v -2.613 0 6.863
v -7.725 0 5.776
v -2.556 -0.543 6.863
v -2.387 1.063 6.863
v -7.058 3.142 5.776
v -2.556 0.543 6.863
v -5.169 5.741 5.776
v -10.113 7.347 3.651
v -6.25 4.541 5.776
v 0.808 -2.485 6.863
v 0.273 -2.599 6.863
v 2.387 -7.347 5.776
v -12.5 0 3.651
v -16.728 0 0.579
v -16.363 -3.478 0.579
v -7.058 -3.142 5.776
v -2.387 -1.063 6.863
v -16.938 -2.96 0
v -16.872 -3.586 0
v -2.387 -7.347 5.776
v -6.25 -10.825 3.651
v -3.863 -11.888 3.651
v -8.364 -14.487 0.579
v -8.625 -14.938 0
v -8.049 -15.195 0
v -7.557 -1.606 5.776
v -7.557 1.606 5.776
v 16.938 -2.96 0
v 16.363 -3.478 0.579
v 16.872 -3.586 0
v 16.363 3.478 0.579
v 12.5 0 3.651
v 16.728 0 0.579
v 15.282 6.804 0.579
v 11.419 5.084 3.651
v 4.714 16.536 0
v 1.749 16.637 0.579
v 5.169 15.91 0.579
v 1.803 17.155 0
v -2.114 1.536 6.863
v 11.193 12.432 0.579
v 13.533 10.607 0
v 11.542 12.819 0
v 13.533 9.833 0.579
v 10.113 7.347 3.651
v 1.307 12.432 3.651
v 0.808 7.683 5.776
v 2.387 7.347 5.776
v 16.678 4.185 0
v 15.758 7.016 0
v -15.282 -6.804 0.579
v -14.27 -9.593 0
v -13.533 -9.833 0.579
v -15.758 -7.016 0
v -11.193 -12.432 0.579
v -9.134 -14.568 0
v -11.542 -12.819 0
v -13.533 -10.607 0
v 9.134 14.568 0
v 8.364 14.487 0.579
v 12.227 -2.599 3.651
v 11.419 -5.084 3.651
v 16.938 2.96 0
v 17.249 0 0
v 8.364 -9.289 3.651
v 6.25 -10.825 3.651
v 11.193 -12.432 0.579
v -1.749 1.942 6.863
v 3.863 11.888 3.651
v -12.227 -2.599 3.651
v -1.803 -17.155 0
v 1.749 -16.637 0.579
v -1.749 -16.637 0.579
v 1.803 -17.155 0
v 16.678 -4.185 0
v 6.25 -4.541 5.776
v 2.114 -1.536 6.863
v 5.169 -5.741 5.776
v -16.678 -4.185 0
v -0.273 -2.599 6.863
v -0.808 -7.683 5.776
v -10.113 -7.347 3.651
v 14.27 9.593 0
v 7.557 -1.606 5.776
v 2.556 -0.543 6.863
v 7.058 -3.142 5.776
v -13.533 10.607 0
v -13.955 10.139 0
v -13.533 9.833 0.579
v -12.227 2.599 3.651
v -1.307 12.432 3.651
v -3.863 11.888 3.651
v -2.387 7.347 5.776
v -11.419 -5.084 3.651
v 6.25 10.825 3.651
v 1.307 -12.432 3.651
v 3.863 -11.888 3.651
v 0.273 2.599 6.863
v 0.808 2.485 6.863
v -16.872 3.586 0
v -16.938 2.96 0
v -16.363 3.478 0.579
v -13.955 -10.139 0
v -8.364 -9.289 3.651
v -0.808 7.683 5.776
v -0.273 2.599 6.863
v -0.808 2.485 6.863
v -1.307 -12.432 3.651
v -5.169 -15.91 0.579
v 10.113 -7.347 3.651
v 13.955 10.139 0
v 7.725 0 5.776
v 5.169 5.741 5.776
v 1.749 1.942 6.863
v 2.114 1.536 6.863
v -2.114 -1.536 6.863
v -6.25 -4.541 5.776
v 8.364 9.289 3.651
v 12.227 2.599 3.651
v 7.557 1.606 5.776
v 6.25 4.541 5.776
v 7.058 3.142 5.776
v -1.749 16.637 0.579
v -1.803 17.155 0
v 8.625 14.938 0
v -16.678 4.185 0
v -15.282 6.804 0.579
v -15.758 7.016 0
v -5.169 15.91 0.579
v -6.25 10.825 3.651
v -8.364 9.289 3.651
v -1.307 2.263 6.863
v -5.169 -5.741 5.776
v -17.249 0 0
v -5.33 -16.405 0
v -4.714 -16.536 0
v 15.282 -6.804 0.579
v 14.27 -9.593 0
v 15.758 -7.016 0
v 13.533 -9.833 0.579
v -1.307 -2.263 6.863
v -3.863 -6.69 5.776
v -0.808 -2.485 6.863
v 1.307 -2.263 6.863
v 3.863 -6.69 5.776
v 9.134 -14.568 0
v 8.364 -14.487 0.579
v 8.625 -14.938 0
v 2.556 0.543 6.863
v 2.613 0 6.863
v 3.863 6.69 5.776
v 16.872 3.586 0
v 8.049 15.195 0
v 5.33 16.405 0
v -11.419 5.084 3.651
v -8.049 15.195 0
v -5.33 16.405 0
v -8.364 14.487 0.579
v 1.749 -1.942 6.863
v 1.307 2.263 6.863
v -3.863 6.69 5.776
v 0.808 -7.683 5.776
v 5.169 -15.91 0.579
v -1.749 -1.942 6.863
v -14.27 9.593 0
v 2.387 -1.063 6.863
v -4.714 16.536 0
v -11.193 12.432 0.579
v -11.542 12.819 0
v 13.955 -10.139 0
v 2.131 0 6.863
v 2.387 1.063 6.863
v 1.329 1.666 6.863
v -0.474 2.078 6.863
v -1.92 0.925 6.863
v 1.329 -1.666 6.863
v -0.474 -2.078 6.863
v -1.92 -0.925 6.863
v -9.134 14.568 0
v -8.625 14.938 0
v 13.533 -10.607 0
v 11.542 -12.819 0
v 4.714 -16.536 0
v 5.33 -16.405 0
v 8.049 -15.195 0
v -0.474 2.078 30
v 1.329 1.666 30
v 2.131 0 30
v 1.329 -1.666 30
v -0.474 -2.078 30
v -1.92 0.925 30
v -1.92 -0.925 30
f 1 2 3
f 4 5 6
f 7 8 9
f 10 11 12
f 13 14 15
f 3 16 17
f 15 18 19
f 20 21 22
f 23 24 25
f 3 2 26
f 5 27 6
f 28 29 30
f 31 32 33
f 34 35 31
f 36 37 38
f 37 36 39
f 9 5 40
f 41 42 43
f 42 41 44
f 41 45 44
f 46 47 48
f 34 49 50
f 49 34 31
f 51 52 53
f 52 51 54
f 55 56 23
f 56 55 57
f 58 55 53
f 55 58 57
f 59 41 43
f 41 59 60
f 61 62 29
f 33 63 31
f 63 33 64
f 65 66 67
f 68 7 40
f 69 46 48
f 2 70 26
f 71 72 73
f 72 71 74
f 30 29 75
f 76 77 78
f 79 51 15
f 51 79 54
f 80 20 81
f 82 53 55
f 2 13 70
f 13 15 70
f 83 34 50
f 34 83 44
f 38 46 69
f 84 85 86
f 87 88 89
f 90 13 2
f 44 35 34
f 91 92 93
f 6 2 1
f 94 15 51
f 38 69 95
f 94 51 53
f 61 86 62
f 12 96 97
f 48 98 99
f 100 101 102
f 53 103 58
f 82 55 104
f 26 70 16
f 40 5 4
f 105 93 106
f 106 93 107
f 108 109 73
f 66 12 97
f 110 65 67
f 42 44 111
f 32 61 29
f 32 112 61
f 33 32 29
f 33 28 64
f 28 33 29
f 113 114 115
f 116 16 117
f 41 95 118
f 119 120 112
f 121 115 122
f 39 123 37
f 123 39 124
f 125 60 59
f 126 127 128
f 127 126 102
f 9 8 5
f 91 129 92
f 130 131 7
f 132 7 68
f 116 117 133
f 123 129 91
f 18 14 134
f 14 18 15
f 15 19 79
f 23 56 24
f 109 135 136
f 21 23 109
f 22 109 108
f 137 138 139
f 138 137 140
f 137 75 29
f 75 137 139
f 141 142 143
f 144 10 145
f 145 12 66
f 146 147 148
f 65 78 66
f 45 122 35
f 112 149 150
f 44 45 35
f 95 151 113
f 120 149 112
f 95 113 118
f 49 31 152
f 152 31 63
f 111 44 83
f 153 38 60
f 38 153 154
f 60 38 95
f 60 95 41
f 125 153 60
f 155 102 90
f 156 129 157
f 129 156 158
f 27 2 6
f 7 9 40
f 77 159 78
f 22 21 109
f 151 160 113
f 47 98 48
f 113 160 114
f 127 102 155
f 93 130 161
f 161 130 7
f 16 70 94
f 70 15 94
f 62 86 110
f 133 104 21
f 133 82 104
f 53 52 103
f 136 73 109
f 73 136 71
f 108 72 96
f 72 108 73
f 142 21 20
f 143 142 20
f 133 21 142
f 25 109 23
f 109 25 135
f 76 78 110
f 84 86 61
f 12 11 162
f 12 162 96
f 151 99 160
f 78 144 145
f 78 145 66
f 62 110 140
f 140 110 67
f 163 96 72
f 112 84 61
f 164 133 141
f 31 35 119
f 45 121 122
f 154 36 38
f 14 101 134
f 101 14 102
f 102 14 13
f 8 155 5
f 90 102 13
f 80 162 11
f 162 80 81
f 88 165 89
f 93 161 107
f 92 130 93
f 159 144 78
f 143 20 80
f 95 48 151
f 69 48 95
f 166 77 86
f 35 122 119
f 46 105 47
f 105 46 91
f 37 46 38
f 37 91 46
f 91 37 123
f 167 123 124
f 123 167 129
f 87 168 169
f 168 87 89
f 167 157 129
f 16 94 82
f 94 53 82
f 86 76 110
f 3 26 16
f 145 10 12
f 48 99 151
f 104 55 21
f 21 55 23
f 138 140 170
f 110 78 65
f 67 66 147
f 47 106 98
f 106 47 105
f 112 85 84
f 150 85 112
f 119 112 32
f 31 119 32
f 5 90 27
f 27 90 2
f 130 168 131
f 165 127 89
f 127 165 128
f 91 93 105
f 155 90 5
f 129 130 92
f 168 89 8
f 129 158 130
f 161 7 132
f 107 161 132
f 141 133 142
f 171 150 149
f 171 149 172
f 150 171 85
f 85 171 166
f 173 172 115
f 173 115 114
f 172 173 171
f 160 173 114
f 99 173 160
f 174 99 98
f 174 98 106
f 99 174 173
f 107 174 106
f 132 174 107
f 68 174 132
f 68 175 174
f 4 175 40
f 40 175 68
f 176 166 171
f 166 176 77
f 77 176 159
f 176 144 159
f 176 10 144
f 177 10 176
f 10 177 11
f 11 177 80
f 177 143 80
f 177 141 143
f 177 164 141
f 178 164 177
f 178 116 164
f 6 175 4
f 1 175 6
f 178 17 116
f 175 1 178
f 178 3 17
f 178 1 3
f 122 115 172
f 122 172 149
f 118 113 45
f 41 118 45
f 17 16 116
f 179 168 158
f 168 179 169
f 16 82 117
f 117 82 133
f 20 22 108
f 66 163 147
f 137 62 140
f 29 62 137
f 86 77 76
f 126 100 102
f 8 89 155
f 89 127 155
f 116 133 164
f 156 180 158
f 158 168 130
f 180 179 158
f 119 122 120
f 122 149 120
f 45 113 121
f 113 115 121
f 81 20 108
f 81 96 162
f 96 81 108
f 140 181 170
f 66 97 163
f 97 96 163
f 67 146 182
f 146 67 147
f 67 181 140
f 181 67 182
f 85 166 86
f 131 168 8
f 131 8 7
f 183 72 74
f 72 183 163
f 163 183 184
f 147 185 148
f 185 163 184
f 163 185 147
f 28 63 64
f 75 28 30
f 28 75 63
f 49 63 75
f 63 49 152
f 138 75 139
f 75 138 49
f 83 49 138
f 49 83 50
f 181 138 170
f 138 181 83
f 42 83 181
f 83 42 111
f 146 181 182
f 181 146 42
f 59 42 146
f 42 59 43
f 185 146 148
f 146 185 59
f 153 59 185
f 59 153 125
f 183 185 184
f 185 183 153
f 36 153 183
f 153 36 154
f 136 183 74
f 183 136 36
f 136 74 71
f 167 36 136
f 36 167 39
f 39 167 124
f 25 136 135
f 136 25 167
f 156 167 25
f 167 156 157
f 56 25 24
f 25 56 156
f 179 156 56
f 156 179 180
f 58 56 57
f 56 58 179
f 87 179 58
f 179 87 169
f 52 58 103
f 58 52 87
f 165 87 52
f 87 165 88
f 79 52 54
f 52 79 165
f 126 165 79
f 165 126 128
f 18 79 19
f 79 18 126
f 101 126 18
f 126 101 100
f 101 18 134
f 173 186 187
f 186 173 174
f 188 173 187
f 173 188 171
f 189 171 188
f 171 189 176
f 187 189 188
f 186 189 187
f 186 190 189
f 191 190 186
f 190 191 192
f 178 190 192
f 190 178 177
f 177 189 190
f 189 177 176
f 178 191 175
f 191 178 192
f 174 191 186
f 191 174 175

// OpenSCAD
render(convexity=1) {
intersection() {
    translate([0,0,-18]) sphere(d=50);
    cylinder(d=50,h=50);
}
cylinder(d=25.4*3/16-0.5,h=30);
}
